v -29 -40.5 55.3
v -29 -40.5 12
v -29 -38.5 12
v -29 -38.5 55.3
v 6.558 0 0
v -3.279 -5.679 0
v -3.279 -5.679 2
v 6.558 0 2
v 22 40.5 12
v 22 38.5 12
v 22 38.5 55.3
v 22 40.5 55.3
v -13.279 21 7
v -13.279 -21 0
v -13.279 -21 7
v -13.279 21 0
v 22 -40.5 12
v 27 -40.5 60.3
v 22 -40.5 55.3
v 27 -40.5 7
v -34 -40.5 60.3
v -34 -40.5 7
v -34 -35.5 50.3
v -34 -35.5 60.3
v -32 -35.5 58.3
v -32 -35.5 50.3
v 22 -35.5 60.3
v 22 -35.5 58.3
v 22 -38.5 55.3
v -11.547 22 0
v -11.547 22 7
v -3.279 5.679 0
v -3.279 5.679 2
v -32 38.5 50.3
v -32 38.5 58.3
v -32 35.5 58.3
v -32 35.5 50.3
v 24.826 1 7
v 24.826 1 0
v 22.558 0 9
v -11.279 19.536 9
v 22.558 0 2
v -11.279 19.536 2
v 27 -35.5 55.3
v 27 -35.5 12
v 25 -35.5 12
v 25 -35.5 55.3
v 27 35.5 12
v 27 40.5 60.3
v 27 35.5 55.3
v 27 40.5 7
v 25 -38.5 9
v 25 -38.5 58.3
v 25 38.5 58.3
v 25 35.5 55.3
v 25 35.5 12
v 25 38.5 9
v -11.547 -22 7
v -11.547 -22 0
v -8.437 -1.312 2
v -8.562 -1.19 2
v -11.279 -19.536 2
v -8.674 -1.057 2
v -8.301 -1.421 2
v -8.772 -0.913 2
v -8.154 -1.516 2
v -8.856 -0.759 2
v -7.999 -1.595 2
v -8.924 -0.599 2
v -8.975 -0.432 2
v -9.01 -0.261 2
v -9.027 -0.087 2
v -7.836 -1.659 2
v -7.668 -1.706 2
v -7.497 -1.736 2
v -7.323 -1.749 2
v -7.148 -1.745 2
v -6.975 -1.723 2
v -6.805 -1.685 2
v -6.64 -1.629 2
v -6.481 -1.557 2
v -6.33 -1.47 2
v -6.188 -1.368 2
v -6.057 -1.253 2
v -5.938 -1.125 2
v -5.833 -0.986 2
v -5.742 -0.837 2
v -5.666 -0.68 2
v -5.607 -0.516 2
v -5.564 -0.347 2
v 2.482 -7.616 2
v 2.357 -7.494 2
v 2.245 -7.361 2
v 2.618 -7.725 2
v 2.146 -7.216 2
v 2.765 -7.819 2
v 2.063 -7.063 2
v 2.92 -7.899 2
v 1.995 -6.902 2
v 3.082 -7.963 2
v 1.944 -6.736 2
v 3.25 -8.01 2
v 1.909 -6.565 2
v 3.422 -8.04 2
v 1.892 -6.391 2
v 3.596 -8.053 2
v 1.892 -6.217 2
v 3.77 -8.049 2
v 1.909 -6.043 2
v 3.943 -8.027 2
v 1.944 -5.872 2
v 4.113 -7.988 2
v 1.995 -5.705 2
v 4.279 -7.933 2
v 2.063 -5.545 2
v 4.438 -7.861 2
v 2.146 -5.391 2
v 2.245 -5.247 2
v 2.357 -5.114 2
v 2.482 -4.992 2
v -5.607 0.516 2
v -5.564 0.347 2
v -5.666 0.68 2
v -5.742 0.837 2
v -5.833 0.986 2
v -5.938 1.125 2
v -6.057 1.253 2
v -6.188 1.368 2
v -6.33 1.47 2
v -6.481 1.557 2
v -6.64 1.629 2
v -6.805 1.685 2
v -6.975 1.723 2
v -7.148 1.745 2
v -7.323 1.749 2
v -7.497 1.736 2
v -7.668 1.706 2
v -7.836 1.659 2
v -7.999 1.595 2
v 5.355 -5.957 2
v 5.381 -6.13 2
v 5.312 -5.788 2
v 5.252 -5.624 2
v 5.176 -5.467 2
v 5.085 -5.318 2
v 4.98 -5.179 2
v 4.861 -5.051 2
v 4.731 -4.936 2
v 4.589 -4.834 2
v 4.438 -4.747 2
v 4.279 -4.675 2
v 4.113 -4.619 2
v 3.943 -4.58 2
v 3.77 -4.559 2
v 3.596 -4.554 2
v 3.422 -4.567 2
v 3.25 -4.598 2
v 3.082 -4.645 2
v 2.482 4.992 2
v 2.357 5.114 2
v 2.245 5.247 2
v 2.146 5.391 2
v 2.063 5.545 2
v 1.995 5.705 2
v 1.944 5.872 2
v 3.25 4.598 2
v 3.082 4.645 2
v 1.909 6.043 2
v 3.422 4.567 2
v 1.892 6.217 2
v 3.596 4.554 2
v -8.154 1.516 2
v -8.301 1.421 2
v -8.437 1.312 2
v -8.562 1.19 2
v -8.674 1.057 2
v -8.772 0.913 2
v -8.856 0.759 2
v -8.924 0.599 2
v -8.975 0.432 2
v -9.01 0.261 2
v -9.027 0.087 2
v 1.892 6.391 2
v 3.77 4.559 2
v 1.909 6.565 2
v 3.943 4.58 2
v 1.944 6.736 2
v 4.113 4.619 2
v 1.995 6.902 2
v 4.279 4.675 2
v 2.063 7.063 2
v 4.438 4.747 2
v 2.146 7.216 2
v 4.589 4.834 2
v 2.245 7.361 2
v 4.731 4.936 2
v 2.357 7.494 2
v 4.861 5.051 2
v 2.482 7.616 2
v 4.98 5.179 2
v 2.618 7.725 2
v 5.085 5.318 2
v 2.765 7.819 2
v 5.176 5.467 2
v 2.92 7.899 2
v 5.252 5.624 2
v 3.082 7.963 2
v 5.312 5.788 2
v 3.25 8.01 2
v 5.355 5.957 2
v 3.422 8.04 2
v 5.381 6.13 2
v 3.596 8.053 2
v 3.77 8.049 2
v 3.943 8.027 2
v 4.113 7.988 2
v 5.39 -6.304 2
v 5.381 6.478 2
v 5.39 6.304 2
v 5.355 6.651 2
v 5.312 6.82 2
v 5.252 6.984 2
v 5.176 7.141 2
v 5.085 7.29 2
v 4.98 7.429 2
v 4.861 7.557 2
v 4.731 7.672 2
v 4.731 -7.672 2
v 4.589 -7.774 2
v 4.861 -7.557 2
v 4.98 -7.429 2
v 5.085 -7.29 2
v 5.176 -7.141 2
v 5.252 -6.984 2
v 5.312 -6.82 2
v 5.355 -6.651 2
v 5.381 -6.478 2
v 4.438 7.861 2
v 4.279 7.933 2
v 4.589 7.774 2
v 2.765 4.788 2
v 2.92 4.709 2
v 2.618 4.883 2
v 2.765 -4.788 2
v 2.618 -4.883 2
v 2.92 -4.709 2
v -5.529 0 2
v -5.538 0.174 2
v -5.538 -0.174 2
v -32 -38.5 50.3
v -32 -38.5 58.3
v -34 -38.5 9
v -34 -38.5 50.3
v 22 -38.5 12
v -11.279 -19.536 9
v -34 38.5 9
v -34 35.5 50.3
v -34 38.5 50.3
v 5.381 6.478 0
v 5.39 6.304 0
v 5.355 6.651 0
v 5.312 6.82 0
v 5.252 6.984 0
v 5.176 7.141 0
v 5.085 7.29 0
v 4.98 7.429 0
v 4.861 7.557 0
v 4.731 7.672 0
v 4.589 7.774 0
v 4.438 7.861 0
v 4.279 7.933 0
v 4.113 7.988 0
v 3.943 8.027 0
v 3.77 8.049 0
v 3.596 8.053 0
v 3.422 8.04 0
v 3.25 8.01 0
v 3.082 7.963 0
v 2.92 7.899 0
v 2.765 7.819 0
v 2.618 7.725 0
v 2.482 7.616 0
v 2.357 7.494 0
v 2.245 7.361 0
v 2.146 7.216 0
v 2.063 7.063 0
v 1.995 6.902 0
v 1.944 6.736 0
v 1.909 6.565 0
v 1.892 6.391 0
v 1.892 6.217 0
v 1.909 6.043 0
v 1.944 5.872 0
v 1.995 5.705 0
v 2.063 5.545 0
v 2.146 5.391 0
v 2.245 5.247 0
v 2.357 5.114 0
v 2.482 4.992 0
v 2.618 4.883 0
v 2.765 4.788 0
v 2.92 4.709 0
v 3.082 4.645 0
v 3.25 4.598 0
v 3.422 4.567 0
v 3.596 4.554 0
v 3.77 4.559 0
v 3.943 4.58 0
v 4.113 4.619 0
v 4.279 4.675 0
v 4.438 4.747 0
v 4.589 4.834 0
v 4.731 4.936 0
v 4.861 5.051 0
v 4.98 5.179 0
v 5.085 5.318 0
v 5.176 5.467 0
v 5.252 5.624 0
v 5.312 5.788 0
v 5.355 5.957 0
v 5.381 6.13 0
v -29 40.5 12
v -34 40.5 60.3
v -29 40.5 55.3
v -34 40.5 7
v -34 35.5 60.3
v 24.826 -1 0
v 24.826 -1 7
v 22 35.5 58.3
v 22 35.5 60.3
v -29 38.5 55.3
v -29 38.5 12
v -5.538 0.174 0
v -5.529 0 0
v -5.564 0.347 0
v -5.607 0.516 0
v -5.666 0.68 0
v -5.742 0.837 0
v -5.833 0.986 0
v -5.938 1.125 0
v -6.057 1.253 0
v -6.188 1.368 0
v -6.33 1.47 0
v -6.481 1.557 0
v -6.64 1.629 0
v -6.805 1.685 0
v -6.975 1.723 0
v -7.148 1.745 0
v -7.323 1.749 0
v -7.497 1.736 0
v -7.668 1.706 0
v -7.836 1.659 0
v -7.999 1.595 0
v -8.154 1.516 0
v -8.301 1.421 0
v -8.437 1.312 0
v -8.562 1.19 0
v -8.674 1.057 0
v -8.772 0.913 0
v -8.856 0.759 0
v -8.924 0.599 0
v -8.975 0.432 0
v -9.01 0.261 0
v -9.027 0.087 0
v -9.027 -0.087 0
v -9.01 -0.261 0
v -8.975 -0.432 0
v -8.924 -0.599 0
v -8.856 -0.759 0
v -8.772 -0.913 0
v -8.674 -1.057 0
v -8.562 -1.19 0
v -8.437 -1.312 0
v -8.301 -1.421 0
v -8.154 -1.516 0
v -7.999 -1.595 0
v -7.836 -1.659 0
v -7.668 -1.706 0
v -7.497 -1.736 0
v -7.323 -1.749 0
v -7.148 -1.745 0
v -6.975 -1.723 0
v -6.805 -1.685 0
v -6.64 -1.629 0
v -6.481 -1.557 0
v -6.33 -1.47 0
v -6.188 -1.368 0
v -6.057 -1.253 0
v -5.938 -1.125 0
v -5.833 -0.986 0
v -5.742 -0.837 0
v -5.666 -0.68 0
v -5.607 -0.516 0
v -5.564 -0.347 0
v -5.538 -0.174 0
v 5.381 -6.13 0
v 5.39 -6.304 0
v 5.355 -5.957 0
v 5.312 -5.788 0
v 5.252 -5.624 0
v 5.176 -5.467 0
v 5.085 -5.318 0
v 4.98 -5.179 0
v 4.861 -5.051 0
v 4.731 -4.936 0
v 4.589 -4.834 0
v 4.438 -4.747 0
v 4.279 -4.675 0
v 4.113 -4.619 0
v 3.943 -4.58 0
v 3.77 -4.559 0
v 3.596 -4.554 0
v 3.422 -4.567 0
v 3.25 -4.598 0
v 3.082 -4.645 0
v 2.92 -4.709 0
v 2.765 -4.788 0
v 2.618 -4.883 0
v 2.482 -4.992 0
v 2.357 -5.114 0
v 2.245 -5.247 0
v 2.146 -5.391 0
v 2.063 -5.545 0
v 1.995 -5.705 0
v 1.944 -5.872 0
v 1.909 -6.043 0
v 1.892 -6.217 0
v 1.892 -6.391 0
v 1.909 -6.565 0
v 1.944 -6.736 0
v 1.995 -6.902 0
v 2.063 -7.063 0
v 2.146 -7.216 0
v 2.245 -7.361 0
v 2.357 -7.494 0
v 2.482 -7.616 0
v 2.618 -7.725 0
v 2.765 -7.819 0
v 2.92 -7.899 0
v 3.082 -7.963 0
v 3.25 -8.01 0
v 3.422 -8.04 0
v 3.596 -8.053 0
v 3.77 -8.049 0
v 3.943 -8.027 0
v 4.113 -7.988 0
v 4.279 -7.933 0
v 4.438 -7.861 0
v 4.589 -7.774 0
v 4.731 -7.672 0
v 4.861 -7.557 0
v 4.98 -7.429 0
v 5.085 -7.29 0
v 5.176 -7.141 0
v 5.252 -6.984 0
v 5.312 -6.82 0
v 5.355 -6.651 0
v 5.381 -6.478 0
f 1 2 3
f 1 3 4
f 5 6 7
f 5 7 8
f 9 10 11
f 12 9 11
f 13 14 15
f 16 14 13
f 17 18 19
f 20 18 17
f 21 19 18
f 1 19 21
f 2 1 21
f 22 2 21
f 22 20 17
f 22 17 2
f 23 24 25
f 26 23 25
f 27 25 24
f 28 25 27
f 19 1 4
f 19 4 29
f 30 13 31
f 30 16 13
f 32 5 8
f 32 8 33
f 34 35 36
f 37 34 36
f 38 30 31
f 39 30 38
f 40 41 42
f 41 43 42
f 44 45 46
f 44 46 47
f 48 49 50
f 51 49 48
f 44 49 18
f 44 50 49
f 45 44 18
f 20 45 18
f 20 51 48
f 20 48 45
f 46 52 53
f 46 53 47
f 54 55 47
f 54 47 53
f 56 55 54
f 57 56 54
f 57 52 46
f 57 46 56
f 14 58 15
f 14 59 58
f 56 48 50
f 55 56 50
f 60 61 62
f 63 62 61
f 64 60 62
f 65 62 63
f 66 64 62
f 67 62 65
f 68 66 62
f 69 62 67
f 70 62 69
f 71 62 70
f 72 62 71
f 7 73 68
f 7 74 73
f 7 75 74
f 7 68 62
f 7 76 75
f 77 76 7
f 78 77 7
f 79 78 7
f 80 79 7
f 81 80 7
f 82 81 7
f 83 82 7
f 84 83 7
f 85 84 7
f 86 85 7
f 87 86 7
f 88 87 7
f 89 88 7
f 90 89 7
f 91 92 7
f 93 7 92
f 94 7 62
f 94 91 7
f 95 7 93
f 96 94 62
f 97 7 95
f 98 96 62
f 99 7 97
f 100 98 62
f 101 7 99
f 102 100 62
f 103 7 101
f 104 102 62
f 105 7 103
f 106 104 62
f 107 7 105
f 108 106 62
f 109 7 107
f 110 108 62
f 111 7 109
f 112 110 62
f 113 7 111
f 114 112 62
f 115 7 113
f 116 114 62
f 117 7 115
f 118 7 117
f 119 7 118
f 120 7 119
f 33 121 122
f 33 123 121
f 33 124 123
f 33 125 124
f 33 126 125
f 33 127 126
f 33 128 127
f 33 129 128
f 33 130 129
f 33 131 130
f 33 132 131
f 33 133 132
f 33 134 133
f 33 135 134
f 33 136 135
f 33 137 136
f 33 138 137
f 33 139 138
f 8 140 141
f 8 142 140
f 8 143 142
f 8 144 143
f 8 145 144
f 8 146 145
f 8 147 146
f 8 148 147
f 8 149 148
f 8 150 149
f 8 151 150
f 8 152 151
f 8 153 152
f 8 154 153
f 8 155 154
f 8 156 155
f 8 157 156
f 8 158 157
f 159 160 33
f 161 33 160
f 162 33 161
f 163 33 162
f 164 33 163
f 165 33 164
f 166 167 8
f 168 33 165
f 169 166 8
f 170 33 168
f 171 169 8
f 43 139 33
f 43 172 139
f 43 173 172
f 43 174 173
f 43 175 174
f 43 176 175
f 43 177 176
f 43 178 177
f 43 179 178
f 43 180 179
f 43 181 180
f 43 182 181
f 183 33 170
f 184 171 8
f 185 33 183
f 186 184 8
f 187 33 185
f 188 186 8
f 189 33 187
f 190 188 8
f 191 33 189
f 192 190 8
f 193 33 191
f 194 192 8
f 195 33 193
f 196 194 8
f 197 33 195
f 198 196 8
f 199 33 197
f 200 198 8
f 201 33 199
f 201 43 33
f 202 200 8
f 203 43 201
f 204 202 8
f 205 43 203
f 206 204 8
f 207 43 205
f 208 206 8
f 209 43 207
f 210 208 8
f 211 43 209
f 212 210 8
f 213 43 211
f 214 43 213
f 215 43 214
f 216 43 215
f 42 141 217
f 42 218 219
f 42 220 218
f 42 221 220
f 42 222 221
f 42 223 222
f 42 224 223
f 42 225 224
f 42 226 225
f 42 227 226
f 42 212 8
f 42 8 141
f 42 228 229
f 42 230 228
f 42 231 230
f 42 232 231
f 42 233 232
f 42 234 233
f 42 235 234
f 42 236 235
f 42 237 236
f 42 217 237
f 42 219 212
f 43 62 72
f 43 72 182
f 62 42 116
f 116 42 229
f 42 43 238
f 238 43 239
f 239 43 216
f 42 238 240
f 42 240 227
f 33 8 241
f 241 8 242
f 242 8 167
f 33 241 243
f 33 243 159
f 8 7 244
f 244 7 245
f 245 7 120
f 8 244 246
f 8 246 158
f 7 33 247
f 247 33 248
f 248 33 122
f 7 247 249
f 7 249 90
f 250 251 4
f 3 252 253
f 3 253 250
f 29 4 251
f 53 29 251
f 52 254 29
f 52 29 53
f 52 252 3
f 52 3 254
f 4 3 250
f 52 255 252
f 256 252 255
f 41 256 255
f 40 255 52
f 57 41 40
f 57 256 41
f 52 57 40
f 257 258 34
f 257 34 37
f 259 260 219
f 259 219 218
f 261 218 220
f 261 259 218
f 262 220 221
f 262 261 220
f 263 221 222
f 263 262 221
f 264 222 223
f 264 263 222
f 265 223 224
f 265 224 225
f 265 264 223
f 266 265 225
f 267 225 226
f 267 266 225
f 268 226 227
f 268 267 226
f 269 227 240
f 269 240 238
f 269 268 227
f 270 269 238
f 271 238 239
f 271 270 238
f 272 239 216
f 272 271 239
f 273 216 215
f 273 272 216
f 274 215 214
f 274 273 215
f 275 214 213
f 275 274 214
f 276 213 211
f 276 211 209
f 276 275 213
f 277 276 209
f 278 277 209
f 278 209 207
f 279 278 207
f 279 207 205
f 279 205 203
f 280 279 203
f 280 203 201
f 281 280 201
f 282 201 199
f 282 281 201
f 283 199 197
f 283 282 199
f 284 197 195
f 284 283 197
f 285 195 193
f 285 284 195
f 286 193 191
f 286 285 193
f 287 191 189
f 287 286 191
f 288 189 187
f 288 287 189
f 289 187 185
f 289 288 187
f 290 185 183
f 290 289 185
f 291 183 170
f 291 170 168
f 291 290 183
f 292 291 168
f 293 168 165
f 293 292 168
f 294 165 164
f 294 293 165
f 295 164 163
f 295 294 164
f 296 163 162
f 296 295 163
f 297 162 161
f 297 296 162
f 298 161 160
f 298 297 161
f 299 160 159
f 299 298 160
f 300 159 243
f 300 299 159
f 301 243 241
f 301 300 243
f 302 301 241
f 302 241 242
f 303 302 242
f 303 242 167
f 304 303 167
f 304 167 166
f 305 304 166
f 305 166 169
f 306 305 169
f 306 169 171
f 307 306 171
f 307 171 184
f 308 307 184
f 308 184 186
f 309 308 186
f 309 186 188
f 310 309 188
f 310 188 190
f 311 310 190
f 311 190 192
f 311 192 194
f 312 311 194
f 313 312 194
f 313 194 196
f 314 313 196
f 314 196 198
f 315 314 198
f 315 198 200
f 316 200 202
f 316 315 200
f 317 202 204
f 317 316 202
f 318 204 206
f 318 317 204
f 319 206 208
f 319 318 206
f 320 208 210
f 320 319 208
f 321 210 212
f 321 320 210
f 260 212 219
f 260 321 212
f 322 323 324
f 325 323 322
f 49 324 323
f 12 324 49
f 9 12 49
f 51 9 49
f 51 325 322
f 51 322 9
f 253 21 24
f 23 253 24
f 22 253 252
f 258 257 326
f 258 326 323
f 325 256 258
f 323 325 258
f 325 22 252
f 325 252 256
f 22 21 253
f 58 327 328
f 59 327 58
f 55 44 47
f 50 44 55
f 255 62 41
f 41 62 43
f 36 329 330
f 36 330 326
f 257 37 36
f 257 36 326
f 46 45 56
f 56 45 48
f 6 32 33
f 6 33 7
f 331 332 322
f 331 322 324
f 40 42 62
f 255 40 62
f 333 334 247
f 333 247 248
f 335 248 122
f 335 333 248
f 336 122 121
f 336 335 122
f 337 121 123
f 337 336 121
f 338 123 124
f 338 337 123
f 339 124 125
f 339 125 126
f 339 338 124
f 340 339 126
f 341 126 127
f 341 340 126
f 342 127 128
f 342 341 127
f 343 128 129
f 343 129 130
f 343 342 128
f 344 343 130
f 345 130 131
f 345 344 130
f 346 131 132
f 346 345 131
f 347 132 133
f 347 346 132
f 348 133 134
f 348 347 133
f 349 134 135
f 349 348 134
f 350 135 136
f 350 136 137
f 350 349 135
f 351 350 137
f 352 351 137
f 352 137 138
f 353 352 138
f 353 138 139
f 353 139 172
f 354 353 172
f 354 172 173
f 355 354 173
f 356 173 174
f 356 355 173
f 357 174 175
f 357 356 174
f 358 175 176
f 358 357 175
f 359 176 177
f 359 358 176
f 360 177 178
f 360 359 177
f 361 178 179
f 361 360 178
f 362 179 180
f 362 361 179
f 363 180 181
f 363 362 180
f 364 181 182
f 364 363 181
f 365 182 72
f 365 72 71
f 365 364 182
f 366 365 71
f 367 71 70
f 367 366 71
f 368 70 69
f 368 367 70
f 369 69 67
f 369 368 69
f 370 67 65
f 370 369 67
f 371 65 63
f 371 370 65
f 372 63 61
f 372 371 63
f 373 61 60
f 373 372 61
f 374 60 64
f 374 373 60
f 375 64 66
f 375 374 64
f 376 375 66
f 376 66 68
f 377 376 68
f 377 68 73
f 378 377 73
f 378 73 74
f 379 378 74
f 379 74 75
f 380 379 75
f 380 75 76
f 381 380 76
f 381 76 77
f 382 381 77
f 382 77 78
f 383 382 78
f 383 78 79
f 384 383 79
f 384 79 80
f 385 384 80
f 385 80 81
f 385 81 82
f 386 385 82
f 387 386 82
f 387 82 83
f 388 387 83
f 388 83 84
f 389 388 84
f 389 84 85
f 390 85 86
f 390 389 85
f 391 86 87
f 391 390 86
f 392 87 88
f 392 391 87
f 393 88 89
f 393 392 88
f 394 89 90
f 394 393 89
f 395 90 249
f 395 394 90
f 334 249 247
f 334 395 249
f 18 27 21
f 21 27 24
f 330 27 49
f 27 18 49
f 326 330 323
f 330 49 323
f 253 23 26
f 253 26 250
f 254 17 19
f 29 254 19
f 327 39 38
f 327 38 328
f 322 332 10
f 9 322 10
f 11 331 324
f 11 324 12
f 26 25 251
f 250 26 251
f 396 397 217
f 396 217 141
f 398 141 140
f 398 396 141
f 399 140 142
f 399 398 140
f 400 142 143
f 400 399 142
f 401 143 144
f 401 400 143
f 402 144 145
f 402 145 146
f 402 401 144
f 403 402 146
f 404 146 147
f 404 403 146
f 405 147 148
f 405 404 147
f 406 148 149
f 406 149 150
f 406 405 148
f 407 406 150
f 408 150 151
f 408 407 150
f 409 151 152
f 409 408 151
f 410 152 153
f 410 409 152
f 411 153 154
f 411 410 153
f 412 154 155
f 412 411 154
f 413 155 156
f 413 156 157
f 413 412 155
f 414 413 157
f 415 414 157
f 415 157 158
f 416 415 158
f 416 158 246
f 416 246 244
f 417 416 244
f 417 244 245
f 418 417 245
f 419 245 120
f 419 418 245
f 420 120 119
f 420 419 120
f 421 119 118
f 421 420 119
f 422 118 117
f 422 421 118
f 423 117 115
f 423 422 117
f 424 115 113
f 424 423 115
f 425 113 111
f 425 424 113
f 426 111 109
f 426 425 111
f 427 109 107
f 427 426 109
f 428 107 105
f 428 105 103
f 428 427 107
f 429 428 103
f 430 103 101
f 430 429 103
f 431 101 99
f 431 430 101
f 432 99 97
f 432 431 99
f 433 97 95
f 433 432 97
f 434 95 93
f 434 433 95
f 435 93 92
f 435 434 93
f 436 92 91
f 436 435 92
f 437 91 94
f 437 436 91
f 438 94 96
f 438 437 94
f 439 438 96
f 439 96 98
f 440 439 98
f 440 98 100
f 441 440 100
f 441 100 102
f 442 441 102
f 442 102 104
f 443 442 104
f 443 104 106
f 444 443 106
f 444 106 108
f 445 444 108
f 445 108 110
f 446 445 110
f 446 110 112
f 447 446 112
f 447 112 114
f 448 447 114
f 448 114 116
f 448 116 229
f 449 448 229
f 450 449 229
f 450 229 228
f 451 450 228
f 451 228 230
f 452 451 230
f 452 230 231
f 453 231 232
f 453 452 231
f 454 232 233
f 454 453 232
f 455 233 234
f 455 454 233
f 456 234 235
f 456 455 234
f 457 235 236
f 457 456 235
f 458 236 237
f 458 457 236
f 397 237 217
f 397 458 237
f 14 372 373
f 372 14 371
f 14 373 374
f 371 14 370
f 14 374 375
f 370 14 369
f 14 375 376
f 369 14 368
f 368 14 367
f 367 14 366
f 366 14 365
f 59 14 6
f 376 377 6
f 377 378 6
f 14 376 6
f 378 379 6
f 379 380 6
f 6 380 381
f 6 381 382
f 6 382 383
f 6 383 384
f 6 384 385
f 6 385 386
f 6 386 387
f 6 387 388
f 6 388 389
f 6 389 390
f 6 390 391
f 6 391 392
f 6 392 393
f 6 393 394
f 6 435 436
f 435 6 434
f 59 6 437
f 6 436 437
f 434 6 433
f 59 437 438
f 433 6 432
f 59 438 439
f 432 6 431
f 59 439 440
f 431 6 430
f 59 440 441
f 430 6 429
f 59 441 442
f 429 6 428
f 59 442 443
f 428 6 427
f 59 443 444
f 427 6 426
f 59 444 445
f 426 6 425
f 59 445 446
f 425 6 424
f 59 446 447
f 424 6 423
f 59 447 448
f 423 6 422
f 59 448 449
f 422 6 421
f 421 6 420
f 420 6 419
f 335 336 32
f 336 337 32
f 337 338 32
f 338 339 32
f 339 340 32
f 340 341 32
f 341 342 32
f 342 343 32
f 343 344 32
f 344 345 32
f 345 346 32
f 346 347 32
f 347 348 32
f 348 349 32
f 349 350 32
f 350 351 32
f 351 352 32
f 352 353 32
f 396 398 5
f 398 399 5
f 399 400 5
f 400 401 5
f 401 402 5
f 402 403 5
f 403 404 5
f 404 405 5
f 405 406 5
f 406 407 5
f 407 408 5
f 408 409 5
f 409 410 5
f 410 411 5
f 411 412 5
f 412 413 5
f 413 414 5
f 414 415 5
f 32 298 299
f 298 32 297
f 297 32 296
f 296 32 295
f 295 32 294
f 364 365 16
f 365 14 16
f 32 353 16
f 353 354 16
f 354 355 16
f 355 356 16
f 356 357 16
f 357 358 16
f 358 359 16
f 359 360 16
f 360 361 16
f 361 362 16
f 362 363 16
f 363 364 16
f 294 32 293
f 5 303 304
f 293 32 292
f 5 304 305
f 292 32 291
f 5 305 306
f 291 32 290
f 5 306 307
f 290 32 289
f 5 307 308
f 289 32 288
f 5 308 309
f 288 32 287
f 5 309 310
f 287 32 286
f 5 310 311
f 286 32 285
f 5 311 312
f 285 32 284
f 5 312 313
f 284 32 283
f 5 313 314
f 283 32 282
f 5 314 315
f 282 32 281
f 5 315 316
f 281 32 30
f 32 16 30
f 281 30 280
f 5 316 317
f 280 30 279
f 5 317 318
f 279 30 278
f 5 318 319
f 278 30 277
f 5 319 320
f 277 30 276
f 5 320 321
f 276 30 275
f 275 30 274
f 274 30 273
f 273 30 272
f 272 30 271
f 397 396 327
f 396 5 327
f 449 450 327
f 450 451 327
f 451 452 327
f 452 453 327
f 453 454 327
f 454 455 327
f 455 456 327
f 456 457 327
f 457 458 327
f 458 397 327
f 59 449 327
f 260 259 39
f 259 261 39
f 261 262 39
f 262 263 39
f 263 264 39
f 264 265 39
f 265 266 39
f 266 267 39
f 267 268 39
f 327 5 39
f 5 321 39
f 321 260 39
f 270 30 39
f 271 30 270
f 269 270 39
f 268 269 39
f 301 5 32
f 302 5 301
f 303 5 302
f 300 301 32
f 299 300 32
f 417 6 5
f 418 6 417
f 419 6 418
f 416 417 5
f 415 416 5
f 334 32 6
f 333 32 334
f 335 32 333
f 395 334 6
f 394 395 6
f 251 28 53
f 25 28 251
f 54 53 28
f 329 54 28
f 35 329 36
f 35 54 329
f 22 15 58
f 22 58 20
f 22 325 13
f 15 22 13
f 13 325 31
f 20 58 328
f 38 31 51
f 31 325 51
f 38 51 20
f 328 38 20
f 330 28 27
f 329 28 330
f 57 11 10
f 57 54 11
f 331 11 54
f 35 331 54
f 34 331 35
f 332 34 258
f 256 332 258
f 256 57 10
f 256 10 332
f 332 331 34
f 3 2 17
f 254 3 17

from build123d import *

# Parameters (mm, degrees)
SKETCH_R        = 1.75
PAD_DEPTH       = 2
PAD001_DEPTH    = 5
SKETCH002_W     = 61
SKETCH002_H     = 81
PAD002_DEPTH    = 2
PAD003_DEPTH    = 49.3
PAD004_DEPTH    = 2
SKETCH005_W     = 5
SKETCH005_H     = 10
PAD005_DEPTH    = 2
SKETCH006_W     = 51
SKETCH006_H     = 43.3
POCKET_DEPTH    = 81
SKETCH007_W     = 71
SKETCH007_H     = 43.3
POCKET001_DEPTH = 2


with BuildPart() as part:
    # Sketch → Pad (new body)
    with BuildSketch(Plane.XY):
        Polygon((-13.279056, 21), (-13.279056, -21), (-11.547005, -22), (24.826062, -1), (24.826062, 1), (-11.547005, 22), align=None)
        with Locations((-7.279056, 0)):
            Circle(SKETCH_R, mode=Mode.SUBTRACT)
        with Locations((3.639528, 6.303848)):
            Circle(SKETCH_R, mode=Mode.SUBTRACT)
        with Locations((3.639528, -6.303848)):
            Circle(SKETCH_R, mode=Mode.SUBTRACT)
        Polygon((6.558112, 0), (-3.279056, 5.679492), (-3.279056, -5.679492), align=None, mode=Mode.SUBTRACT)
    extrude(amount=PAD_DEPTH)

    # Sketch001 (on Face14 of Pad) → Pad001 (join)
    with BuildSketch(Plane.XY.offset(2)):
        Polygon((-13.279056, 21), (-11.547005, 22), (24.826062, 1), (24.826062, -1), (-11.547005, -22), (-13.279056, -21), align=None)
        Polygon((22.558112, 0), (-11.279056, 19.535898), (-11.279056, -19.535898), align=None, mode=Mode.SUBTRACT)
    extrude(amount=PAD001_DEPTH)

    # Sketch002 (on Face17 of Pad001) → Pad002 (join)
    with BuildSketch(Plane.XY.offset(7)):
        with Locations((-3.5, 0)):
            Rectangle(SKETCH002_W, SKETCH002_H)
        Polygon((-11.279056, 19.535898), (22.558112, 0), (-11.279056, -19.535898), align=None, mode=Mode.SUBTRACT)
    extrude(amount=PAD002_DEPTH)

    # Sketch003 (on Face29 of Pad002) → Pad003 (join)
    with BuildSketch(Plane.XY.offset(9)):
        Polygon((-34, 40.5), (27, 40.5), (27, -40.5), (-34, -40.5), (-34, -38.5), (25, -38.5), (25, 38.5), (-34, 38.5), align=None)
    extrude(amount=PAD003_DEPTH)

    # Sketch004 (on Face38 of Pad003) → Pad004 (join)
    with BuildSketch(Plane.XY.offset(58.3)):
        Polygon((-34, 40.5), (27, 40.5), (27, -40.5), (-34, -40.5), (-34, -35.5), (22, -35.5), (22, 35.5), (-34, 35.5), align=None)
    extrude(amount=PAD004_DEPTH)

    # Sketch005 (on Face30 of Pad004) → Pad005 (join)
    with BuildSketch(Plane(origin=(-34, 0, 0), x_dir=(0, -1, 0), z_dir=(-1, 0, 0))):
        with Locations((-38, 55.3)):
            Rectangle(SKETCH005_W, SKETCH005_H)
        with Locations((38, 55.3)):
            Rectangle(SKETCH005_W, SKETCH005_H)
    extrude(amount=-PAD005_DEPTH)

    # Sketch006 → Pocket (cut)
    with BuildSketch(Plane.XZ.offset(40.5)):
        with Locations((-3.5, 33.65)):
            Rectangle(SKETCH006_W, SKETCH006_H)
    extrude(amount=-POCKET_DEPTH, mode=Mode.SUBTRACT)

    # Sketch007 → Pocket001 (cut)
    with BuildSketch(Plane.YZ.offset(27)):
        with Locations((0, 33.65)):
            Rectangle(SKETCH007_W, SKETCH007_H)
    extrude(amount=-POCKET001_DEPTH, mode=Mode.SUBTRACT)


solid = part.part
